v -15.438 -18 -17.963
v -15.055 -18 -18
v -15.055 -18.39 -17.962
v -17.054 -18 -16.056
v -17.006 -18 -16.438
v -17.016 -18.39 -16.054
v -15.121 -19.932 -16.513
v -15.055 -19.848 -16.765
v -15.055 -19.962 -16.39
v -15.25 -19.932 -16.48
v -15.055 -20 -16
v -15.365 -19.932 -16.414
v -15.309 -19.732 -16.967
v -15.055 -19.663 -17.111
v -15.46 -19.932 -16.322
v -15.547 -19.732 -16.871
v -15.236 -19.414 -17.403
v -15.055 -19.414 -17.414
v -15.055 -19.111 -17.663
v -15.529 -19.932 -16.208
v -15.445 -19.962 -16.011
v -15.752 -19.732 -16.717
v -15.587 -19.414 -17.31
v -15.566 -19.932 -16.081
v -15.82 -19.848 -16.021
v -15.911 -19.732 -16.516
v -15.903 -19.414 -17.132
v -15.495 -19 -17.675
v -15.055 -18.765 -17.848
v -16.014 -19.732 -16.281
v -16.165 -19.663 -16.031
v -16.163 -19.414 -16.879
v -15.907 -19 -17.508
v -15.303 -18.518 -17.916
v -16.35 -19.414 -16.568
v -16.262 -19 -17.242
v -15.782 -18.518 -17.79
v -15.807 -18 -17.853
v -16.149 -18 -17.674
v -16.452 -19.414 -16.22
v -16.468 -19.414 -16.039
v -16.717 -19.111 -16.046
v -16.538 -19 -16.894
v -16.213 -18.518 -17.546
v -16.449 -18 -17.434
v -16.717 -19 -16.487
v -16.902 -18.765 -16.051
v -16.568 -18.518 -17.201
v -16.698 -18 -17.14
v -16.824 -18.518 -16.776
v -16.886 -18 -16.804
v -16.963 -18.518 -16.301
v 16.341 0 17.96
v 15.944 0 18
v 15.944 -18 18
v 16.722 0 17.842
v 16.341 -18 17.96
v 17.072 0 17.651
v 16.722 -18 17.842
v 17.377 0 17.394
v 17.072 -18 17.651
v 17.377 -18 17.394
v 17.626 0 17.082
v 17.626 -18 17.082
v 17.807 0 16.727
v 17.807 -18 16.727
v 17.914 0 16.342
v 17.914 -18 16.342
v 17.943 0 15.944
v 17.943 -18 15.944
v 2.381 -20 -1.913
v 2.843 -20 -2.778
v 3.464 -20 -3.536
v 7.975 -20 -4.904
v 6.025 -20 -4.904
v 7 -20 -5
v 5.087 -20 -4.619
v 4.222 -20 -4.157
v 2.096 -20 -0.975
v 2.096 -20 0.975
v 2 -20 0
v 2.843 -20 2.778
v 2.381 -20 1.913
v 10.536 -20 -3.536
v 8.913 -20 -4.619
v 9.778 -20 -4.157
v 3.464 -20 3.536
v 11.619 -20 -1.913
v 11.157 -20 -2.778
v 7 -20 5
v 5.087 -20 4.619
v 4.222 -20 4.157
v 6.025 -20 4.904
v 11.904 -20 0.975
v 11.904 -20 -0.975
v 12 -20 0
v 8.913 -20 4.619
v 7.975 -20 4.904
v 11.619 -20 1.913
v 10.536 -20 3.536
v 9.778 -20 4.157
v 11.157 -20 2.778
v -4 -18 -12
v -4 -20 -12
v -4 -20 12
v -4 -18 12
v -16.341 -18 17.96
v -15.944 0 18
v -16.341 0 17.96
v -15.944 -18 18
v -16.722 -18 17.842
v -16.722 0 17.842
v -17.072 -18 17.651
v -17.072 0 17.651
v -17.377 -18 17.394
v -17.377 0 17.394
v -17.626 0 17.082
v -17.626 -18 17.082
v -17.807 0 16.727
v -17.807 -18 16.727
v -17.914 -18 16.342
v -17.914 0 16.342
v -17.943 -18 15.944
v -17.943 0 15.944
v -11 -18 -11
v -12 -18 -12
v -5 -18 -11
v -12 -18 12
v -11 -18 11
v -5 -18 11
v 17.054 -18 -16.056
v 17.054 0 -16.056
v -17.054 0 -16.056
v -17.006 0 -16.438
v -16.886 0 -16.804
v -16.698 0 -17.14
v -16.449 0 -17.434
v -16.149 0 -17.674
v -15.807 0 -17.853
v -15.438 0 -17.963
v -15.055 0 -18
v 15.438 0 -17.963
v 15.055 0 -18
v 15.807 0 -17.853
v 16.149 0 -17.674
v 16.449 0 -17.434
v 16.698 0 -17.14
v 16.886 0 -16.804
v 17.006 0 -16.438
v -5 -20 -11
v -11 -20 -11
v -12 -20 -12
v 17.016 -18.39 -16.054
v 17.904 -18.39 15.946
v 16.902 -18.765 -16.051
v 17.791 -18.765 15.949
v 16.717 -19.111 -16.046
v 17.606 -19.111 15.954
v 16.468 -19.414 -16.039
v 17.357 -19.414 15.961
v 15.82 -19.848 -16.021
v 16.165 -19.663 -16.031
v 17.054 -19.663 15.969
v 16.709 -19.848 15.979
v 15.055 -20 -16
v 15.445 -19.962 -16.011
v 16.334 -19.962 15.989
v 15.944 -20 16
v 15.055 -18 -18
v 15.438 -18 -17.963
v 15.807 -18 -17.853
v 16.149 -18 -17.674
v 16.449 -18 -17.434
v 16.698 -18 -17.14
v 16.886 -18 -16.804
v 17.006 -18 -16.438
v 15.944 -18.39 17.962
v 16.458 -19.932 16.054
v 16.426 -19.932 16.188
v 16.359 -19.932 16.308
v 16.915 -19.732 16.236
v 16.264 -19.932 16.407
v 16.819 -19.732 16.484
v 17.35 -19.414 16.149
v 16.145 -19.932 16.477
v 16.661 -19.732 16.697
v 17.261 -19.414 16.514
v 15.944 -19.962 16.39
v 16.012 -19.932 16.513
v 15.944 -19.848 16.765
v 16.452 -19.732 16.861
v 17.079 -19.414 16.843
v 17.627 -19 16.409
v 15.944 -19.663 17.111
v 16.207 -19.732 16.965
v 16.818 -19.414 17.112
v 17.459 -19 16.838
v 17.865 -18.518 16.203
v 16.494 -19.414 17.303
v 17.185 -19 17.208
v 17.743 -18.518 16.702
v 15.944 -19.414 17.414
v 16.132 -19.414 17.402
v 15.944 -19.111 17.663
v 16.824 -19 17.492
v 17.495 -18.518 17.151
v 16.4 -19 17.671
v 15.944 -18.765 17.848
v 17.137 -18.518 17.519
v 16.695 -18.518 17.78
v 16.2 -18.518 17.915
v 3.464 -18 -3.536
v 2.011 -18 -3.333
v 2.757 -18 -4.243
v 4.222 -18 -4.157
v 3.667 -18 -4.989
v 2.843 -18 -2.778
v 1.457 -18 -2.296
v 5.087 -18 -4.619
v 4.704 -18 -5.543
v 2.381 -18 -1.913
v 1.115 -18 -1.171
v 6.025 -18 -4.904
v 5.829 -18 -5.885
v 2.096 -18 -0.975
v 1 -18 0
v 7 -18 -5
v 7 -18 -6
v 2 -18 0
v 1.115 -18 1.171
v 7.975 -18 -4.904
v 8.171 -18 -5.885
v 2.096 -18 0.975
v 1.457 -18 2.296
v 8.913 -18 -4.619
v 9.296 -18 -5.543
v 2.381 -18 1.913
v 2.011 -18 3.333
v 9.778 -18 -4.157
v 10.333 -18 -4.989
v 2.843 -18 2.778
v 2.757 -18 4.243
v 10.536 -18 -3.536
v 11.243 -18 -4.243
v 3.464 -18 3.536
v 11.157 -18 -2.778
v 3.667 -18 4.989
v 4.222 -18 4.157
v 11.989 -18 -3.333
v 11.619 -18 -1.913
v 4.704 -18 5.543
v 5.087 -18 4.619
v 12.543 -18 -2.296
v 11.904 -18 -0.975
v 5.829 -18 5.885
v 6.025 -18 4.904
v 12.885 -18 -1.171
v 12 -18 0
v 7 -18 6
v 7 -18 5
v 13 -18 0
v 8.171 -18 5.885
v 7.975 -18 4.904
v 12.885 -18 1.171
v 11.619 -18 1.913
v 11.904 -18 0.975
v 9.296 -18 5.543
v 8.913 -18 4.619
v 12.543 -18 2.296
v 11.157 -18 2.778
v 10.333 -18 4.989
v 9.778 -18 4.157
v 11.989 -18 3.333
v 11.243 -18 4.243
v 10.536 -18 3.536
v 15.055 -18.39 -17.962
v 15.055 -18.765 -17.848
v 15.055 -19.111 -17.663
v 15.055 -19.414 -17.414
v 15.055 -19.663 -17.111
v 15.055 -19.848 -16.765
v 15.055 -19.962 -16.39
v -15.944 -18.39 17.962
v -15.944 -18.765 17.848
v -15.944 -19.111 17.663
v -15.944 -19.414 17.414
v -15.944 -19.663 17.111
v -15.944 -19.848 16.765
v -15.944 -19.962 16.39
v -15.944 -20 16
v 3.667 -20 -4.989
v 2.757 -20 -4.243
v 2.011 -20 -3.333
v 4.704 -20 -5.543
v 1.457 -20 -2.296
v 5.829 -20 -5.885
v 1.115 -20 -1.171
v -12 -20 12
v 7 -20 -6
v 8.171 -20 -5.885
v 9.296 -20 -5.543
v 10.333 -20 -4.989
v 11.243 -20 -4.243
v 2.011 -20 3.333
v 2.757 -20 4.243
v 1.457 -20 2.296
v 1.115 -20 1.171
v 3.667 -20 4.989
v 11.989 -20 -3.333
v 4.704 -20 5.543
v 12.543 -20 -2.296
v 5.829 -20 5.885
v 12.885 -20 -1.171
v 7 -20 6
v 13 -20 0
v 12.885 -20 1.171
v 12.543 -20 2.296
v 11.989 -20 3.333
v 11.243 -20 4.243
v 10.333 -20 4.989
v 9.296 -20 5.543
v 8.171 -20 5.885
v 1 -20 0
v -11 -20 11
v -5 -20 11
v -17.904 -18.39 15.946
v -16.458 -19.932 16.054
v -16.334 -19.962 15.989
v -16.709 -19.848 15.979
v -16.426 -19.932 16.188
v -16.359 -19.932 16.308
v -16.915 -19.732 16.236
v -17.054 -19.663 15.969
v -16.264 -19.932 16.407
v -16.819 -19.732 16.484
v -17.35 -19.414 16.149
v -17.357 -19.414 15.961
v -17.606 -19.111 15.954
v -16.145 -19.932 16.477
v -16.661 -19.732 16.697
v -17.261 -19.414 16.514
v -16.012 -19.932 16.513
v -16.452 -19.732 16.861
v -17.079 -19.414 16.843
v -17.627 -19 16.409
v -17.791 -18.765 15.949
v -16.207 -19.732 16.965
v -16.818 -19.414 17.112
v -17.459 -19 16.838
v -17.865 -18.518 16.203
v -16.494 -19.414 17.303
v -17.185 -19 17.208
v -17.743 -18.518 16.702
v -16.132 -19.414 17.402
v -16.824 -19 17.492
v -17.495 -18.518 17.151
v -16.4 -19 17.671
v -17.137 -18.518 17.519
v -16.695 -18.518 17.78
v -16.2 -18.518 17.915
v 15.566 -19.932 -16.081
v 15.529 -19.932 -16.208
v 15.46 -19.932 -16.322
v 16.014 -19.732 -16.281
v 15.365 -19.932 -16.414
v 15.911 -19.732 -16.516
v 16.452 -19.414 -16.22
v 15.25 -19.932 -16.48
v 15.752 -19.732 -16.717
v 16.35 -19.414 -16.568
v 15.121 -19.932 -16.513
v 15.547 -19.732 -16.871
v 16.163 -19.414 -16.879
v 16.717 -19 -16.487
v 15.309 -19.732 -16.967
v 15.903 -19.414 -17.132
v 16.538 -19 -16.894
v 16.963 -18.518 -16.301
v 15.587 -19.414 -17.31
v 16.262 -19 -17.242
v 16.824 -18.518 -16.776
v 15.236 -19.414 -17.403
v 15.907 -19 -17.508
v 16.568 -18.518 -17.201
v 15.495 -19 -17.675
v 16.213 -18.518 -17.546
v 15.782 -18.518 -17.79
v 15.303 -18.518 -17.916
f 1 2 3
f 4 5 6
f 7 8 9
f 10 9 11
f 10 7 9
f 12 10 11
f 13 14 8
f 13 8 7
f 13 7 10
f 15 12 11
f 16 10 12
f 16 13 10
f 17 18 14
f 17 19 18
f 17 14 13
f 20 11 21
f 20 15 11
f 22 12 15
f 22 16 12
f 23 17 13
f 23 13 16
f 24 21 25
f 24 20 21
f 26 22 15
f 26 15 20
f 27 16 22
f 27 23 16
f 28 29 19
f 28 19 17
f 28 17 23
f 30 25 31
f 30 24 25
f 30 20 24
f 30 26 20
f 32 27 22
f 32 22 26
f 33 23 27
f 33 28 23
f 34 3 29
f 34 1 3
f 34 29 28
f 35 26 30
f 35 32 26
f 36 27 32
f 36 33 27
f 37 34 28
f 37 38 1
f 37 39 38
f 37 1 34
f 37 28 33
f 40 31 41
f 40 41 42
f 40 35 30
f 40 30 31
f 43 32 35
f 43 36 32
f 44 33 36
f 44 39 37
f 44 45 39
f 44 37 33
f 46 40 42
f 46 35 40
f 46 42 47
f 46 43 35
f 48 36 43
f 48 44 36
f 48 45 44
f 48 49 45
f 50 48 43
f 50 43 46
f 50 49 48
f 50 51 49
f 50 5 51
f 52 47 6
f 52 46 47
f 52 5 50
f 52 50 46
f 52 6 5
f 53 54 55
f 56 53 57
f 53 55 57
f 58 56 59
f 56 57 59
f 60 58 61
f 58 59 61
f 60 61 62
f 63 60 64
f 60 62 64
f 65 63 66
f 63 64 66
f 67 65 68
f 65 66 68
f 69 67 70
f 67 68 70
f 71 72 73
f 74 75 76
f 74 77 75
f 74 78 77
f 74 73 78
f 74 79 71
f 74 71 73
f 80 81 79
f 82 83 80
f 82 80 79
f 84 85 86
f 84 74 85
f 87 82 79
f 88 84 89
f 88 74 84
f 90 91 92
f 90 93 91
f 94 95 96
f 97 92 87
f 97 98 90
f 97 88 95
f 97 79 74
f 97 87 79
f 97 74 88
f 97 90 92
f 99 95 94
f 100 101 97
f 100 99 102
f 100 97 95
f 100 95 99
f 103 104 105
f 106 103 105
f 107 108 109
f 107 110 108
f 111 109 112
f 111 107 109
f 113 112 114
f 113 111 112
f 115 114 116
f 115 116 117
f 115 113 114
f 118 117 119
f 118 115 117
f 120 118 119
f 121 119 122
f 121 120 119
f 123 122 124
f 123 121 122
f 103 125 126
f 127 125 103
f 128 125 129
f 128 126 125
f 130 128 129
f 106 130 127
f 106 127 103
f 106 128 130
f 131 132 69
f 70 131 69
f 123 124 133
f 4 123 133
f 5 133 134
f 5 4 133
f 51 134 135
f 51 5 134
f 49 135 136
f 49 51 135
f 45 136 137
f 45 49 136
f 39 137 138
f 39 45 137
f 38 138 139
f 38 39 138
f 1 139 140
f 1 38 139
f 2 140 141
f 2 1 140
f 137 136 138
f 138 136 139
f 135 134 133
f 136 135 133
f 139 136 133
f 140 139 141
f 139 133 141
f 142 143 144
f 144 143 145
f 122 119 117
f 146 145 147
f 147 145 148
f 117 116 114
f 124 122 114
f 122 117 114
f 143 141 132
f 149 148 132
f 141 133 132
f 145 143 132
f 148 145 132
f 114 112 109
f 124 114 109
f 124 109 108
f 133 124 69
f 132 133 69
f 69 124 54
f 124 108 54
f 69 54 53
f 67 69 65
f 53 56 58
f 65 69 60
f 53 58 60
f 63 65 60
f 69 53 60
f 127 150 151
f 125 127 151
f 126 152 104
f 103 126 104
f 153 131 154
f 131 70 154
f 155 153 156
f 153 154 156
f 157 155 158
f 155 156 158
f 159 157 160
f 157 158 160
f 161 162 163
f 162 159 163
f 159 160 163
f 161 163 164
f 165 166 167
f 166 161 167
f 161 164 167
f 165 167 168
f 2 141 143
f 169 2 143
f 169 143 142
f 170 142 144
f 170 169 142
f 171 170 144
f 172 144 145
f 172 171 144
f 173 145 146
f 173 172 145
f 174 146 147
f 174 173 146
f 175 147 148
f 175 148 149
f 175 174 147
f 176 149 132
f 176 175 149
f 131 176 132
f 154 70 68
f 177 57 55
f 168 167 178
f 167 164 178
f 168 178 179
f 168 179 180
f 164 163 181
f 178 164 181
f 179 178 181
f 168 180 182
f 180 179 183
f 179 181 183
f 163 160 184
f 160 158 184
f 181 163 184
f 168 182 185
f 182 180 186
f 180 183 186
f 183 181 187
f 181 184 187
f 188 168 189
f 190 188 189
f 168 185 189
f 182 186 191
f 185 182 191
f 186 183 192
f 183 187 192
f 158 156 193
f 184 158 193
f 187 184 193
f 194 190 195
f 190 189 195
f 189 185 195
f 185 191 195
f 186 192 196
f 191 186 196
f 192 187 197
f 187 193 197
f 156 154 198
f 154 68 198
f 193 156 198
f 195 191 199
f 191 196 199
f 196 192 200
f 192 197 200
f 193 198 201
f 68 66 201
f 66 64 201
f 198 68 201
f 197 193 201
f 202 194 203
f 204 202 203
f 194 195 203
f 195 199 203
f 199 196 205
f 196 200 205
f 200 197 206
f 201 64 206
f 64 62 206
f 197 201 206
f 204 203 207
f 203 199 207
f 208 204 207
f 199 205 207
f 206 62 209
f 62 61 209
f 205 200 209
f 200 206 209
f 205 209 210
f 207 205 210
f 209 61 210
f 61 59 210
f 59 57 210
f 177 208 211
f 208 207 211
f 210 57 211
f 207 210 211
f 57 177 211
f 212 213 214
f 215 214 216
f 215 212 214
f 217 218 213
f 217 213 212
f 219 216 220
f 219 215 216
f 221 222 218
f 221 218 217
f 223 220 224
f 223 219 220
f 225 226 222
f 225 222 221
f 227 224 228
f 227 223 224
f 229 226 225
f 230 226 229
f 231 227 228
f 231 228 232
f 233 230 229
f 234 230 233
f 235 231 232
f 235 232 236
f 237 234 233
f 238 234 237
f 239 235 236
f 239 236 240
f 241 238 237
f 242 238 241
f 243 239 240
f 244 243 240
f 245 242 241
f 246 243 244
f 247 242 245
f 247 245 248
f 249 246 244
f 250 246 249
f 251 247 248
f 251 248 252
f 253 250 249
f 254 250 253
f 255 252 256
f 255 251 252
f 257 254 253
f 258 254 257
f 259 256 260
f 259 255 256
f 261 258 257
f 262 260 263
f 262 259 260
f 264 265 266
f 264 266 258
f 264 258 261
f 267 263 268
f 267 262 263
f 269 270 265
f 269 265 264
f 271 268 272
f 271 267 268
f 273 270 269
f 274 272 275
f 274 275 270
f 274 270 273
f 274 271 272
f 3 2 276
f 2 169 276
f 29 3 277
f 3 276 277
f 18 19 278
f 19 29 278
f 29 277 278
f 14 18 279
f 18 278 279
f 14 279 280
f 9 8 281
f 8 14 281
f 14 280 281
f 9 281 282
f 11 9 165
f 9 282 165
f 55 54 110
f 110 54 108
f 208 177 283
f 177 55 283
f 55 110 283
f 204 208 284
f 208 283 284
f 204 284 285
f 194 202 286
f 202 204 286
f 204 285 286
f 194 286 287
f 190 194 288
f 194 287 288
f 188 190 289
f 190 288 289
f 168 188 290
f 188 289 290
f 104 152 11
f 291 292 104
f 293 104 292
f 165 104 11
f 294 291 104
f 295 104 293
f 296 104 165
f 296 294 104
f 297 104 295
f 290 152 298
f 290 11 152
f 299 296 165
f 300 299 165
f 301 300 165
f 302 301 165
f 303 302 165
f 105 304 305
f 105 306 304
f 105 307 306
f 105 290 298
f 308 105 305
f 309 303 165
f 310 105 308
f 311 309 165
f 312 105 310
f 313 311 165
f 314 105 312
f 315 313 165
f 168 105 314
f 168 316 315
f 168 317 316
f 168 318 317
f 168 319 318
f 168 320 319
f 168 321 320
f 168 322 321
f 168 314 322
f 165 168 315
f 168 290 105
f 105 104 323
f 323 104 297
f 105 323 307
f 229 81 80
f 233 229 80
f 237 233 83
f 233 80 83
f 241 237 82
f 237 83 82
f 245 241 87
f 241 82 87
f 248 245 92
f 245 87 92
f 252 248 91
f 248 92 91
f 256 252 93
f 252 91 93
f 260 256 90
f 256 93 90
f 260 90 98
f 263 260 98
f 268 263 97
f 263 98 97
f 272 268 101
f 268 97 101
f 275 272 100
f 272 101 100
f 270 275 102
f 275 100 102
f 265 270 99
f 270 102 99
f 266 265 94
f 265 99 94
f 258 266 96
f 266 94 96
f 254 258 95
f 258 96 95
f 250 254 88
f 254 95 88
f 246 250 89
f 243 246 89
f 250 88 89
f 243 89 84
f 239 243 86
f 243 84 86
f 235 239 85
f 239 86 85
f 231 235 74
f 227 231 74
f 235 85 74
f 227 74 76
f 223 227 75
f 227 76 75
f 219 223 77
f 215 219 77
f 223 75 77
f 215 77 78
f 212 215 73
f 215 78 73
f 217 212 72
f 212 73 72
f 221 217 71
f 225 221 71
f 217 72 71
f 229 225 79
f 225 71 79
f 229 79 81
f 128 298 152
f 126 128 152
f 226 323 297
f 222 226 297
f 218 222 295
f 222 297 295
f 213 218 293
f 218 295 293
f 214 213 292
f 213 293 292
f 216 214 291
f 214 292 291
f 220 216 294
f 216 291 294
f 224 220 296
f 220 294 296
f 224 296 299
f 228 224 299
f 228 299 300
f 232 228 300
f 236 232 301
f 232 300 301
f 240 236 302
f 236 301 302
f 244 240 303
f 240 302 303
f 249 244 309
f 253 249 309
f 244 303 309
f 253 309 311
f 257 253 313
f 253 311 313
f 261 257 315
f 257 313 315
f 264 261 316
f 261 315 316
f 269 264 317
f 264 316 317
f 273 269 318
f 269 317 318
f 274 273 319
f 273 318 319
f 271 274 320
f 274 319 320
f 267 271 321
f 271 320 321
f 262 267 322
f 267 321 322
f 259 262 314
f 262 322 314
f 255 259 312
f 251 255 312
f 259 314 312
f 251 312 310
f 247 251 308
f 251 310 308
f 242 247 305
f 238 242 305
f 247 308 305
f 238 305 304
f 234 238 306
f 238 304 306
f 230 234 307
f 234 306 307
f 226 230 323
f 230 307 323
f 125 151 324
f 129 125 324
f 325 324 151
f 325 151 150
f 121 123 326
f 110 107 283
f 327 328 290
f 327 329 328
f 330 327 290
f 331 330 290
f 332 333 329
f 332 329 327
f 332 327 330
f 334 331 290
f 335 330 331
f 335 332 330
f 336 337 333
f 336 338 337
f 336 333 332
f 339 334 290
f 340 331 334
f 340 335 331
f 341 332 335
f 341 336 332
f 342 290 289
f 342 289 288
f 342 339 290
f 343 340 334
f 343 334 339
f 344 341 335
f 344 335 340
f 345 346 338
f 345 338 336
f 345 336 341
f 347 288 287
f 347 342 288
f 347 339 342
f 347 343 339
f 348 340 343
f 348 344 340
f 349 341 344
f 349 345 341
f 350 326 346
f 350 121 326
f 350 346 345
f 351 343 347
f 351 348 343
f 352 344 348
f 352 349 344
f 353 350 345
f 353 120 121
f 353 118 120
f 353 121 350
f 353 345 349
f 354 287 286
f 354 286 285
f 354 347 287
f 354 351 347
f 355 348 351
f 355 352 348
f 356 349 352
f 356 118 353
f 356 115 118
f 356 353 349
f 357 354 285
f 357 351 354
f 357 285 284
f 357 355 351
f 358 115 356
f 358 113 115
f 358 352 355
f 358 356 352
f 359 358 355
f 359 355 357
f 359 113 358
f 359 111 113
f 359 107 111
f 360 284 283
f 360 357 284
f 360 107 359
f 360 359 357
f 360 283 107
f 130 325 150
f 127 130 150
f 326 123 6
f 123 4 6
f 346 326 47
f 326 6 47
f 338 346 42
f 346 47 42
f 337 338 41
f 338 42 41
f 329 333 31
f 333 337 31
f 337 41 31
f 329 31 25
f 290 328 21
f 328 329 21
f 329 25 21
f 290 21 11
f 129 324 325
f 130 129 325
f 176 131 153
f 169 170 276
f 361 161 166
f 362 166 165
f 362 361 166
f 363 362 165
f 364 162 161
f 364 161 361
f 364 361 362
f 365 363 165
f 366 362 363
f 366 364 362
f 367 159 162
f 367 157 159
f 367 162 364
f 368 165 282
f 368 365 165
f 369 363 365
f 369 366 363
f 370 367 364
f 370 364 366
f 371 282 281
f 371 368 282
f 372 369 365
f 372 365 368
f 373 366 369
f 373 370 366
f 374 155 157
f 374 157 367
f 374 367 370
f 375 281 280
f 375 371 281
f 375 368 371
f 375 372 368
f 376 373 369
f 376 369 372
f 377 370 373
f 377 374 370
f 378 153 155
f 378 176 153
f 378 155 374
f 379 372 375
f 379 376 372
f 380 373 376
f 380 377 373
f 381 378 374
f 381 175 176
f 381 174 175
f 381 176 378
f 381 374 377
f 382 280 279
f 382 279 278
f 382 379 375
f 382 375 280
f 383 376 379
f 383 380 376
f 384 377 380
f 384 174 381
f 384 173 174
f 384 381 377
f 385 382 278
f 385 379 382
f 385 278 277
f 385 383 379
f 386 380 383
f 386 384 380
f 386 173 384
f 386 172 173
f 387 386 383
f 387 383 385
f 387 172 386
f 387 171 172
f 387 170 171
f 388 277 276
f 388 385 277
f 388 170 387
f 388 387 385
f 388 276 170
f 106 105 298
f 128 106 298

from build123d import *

# Parameters (mm, degrees)
F1_DEPTH = 20
F2_R     = 2
F4_DEPTH = 2


with BuildPart() as f1:
    # F0 (on Front) → F1 (new body)
    with BuildSketch(Plane.XZ):
        Polygon((18, 18), (-18, 18), (-17, -18), (17, -18), align=None)
    extrude(amount=F1_DEPTH)

    # F2
    f2_edges = [f1.edges().sort_by_distance(p)[0] for p in [
        (-17, -10, -18),
        (-18, -10, 18),
        (18, -10, 18),
        (17, -10, -18),
        (17.5, -20, 0),
        (0, -20, -18),
        (-17.5, -20, 0),
        (0, -20, 18),
    ]]
    fillet(f2_edges, radius=F2_R)

    # F3 (on face) → F4 (cut)
    with BuildSketch(Plane.XZ.offset(20)):
        Polygon((-4, -12), (-4, 0), (-4, 12), (-12, 12), (-12, -12), align=None)
        Polygon((-5, 11), (-5, 0), (-5, -11), (-11, -11), (-11, 11), align=None, mode=Mode.SUBTRACT)
        with BuildLine():
            ThreePointArc((13, 0), (7, 6), (1, 0))
            ThreePointArc((1, 0), (7, -6), (13, 0))
        make_face()
        with BuildLine():
            ThreePointArc((12, 0), (7, -5), (2, 0))
            ThreePointArc((2, 0), (7, 5), (12, 0))
        make_face(mode=Mode.SUBTRACT)
    extrude(amount=-F4_DEPTH, mode=Mode.SUBTRACT)


solid = f1.part
